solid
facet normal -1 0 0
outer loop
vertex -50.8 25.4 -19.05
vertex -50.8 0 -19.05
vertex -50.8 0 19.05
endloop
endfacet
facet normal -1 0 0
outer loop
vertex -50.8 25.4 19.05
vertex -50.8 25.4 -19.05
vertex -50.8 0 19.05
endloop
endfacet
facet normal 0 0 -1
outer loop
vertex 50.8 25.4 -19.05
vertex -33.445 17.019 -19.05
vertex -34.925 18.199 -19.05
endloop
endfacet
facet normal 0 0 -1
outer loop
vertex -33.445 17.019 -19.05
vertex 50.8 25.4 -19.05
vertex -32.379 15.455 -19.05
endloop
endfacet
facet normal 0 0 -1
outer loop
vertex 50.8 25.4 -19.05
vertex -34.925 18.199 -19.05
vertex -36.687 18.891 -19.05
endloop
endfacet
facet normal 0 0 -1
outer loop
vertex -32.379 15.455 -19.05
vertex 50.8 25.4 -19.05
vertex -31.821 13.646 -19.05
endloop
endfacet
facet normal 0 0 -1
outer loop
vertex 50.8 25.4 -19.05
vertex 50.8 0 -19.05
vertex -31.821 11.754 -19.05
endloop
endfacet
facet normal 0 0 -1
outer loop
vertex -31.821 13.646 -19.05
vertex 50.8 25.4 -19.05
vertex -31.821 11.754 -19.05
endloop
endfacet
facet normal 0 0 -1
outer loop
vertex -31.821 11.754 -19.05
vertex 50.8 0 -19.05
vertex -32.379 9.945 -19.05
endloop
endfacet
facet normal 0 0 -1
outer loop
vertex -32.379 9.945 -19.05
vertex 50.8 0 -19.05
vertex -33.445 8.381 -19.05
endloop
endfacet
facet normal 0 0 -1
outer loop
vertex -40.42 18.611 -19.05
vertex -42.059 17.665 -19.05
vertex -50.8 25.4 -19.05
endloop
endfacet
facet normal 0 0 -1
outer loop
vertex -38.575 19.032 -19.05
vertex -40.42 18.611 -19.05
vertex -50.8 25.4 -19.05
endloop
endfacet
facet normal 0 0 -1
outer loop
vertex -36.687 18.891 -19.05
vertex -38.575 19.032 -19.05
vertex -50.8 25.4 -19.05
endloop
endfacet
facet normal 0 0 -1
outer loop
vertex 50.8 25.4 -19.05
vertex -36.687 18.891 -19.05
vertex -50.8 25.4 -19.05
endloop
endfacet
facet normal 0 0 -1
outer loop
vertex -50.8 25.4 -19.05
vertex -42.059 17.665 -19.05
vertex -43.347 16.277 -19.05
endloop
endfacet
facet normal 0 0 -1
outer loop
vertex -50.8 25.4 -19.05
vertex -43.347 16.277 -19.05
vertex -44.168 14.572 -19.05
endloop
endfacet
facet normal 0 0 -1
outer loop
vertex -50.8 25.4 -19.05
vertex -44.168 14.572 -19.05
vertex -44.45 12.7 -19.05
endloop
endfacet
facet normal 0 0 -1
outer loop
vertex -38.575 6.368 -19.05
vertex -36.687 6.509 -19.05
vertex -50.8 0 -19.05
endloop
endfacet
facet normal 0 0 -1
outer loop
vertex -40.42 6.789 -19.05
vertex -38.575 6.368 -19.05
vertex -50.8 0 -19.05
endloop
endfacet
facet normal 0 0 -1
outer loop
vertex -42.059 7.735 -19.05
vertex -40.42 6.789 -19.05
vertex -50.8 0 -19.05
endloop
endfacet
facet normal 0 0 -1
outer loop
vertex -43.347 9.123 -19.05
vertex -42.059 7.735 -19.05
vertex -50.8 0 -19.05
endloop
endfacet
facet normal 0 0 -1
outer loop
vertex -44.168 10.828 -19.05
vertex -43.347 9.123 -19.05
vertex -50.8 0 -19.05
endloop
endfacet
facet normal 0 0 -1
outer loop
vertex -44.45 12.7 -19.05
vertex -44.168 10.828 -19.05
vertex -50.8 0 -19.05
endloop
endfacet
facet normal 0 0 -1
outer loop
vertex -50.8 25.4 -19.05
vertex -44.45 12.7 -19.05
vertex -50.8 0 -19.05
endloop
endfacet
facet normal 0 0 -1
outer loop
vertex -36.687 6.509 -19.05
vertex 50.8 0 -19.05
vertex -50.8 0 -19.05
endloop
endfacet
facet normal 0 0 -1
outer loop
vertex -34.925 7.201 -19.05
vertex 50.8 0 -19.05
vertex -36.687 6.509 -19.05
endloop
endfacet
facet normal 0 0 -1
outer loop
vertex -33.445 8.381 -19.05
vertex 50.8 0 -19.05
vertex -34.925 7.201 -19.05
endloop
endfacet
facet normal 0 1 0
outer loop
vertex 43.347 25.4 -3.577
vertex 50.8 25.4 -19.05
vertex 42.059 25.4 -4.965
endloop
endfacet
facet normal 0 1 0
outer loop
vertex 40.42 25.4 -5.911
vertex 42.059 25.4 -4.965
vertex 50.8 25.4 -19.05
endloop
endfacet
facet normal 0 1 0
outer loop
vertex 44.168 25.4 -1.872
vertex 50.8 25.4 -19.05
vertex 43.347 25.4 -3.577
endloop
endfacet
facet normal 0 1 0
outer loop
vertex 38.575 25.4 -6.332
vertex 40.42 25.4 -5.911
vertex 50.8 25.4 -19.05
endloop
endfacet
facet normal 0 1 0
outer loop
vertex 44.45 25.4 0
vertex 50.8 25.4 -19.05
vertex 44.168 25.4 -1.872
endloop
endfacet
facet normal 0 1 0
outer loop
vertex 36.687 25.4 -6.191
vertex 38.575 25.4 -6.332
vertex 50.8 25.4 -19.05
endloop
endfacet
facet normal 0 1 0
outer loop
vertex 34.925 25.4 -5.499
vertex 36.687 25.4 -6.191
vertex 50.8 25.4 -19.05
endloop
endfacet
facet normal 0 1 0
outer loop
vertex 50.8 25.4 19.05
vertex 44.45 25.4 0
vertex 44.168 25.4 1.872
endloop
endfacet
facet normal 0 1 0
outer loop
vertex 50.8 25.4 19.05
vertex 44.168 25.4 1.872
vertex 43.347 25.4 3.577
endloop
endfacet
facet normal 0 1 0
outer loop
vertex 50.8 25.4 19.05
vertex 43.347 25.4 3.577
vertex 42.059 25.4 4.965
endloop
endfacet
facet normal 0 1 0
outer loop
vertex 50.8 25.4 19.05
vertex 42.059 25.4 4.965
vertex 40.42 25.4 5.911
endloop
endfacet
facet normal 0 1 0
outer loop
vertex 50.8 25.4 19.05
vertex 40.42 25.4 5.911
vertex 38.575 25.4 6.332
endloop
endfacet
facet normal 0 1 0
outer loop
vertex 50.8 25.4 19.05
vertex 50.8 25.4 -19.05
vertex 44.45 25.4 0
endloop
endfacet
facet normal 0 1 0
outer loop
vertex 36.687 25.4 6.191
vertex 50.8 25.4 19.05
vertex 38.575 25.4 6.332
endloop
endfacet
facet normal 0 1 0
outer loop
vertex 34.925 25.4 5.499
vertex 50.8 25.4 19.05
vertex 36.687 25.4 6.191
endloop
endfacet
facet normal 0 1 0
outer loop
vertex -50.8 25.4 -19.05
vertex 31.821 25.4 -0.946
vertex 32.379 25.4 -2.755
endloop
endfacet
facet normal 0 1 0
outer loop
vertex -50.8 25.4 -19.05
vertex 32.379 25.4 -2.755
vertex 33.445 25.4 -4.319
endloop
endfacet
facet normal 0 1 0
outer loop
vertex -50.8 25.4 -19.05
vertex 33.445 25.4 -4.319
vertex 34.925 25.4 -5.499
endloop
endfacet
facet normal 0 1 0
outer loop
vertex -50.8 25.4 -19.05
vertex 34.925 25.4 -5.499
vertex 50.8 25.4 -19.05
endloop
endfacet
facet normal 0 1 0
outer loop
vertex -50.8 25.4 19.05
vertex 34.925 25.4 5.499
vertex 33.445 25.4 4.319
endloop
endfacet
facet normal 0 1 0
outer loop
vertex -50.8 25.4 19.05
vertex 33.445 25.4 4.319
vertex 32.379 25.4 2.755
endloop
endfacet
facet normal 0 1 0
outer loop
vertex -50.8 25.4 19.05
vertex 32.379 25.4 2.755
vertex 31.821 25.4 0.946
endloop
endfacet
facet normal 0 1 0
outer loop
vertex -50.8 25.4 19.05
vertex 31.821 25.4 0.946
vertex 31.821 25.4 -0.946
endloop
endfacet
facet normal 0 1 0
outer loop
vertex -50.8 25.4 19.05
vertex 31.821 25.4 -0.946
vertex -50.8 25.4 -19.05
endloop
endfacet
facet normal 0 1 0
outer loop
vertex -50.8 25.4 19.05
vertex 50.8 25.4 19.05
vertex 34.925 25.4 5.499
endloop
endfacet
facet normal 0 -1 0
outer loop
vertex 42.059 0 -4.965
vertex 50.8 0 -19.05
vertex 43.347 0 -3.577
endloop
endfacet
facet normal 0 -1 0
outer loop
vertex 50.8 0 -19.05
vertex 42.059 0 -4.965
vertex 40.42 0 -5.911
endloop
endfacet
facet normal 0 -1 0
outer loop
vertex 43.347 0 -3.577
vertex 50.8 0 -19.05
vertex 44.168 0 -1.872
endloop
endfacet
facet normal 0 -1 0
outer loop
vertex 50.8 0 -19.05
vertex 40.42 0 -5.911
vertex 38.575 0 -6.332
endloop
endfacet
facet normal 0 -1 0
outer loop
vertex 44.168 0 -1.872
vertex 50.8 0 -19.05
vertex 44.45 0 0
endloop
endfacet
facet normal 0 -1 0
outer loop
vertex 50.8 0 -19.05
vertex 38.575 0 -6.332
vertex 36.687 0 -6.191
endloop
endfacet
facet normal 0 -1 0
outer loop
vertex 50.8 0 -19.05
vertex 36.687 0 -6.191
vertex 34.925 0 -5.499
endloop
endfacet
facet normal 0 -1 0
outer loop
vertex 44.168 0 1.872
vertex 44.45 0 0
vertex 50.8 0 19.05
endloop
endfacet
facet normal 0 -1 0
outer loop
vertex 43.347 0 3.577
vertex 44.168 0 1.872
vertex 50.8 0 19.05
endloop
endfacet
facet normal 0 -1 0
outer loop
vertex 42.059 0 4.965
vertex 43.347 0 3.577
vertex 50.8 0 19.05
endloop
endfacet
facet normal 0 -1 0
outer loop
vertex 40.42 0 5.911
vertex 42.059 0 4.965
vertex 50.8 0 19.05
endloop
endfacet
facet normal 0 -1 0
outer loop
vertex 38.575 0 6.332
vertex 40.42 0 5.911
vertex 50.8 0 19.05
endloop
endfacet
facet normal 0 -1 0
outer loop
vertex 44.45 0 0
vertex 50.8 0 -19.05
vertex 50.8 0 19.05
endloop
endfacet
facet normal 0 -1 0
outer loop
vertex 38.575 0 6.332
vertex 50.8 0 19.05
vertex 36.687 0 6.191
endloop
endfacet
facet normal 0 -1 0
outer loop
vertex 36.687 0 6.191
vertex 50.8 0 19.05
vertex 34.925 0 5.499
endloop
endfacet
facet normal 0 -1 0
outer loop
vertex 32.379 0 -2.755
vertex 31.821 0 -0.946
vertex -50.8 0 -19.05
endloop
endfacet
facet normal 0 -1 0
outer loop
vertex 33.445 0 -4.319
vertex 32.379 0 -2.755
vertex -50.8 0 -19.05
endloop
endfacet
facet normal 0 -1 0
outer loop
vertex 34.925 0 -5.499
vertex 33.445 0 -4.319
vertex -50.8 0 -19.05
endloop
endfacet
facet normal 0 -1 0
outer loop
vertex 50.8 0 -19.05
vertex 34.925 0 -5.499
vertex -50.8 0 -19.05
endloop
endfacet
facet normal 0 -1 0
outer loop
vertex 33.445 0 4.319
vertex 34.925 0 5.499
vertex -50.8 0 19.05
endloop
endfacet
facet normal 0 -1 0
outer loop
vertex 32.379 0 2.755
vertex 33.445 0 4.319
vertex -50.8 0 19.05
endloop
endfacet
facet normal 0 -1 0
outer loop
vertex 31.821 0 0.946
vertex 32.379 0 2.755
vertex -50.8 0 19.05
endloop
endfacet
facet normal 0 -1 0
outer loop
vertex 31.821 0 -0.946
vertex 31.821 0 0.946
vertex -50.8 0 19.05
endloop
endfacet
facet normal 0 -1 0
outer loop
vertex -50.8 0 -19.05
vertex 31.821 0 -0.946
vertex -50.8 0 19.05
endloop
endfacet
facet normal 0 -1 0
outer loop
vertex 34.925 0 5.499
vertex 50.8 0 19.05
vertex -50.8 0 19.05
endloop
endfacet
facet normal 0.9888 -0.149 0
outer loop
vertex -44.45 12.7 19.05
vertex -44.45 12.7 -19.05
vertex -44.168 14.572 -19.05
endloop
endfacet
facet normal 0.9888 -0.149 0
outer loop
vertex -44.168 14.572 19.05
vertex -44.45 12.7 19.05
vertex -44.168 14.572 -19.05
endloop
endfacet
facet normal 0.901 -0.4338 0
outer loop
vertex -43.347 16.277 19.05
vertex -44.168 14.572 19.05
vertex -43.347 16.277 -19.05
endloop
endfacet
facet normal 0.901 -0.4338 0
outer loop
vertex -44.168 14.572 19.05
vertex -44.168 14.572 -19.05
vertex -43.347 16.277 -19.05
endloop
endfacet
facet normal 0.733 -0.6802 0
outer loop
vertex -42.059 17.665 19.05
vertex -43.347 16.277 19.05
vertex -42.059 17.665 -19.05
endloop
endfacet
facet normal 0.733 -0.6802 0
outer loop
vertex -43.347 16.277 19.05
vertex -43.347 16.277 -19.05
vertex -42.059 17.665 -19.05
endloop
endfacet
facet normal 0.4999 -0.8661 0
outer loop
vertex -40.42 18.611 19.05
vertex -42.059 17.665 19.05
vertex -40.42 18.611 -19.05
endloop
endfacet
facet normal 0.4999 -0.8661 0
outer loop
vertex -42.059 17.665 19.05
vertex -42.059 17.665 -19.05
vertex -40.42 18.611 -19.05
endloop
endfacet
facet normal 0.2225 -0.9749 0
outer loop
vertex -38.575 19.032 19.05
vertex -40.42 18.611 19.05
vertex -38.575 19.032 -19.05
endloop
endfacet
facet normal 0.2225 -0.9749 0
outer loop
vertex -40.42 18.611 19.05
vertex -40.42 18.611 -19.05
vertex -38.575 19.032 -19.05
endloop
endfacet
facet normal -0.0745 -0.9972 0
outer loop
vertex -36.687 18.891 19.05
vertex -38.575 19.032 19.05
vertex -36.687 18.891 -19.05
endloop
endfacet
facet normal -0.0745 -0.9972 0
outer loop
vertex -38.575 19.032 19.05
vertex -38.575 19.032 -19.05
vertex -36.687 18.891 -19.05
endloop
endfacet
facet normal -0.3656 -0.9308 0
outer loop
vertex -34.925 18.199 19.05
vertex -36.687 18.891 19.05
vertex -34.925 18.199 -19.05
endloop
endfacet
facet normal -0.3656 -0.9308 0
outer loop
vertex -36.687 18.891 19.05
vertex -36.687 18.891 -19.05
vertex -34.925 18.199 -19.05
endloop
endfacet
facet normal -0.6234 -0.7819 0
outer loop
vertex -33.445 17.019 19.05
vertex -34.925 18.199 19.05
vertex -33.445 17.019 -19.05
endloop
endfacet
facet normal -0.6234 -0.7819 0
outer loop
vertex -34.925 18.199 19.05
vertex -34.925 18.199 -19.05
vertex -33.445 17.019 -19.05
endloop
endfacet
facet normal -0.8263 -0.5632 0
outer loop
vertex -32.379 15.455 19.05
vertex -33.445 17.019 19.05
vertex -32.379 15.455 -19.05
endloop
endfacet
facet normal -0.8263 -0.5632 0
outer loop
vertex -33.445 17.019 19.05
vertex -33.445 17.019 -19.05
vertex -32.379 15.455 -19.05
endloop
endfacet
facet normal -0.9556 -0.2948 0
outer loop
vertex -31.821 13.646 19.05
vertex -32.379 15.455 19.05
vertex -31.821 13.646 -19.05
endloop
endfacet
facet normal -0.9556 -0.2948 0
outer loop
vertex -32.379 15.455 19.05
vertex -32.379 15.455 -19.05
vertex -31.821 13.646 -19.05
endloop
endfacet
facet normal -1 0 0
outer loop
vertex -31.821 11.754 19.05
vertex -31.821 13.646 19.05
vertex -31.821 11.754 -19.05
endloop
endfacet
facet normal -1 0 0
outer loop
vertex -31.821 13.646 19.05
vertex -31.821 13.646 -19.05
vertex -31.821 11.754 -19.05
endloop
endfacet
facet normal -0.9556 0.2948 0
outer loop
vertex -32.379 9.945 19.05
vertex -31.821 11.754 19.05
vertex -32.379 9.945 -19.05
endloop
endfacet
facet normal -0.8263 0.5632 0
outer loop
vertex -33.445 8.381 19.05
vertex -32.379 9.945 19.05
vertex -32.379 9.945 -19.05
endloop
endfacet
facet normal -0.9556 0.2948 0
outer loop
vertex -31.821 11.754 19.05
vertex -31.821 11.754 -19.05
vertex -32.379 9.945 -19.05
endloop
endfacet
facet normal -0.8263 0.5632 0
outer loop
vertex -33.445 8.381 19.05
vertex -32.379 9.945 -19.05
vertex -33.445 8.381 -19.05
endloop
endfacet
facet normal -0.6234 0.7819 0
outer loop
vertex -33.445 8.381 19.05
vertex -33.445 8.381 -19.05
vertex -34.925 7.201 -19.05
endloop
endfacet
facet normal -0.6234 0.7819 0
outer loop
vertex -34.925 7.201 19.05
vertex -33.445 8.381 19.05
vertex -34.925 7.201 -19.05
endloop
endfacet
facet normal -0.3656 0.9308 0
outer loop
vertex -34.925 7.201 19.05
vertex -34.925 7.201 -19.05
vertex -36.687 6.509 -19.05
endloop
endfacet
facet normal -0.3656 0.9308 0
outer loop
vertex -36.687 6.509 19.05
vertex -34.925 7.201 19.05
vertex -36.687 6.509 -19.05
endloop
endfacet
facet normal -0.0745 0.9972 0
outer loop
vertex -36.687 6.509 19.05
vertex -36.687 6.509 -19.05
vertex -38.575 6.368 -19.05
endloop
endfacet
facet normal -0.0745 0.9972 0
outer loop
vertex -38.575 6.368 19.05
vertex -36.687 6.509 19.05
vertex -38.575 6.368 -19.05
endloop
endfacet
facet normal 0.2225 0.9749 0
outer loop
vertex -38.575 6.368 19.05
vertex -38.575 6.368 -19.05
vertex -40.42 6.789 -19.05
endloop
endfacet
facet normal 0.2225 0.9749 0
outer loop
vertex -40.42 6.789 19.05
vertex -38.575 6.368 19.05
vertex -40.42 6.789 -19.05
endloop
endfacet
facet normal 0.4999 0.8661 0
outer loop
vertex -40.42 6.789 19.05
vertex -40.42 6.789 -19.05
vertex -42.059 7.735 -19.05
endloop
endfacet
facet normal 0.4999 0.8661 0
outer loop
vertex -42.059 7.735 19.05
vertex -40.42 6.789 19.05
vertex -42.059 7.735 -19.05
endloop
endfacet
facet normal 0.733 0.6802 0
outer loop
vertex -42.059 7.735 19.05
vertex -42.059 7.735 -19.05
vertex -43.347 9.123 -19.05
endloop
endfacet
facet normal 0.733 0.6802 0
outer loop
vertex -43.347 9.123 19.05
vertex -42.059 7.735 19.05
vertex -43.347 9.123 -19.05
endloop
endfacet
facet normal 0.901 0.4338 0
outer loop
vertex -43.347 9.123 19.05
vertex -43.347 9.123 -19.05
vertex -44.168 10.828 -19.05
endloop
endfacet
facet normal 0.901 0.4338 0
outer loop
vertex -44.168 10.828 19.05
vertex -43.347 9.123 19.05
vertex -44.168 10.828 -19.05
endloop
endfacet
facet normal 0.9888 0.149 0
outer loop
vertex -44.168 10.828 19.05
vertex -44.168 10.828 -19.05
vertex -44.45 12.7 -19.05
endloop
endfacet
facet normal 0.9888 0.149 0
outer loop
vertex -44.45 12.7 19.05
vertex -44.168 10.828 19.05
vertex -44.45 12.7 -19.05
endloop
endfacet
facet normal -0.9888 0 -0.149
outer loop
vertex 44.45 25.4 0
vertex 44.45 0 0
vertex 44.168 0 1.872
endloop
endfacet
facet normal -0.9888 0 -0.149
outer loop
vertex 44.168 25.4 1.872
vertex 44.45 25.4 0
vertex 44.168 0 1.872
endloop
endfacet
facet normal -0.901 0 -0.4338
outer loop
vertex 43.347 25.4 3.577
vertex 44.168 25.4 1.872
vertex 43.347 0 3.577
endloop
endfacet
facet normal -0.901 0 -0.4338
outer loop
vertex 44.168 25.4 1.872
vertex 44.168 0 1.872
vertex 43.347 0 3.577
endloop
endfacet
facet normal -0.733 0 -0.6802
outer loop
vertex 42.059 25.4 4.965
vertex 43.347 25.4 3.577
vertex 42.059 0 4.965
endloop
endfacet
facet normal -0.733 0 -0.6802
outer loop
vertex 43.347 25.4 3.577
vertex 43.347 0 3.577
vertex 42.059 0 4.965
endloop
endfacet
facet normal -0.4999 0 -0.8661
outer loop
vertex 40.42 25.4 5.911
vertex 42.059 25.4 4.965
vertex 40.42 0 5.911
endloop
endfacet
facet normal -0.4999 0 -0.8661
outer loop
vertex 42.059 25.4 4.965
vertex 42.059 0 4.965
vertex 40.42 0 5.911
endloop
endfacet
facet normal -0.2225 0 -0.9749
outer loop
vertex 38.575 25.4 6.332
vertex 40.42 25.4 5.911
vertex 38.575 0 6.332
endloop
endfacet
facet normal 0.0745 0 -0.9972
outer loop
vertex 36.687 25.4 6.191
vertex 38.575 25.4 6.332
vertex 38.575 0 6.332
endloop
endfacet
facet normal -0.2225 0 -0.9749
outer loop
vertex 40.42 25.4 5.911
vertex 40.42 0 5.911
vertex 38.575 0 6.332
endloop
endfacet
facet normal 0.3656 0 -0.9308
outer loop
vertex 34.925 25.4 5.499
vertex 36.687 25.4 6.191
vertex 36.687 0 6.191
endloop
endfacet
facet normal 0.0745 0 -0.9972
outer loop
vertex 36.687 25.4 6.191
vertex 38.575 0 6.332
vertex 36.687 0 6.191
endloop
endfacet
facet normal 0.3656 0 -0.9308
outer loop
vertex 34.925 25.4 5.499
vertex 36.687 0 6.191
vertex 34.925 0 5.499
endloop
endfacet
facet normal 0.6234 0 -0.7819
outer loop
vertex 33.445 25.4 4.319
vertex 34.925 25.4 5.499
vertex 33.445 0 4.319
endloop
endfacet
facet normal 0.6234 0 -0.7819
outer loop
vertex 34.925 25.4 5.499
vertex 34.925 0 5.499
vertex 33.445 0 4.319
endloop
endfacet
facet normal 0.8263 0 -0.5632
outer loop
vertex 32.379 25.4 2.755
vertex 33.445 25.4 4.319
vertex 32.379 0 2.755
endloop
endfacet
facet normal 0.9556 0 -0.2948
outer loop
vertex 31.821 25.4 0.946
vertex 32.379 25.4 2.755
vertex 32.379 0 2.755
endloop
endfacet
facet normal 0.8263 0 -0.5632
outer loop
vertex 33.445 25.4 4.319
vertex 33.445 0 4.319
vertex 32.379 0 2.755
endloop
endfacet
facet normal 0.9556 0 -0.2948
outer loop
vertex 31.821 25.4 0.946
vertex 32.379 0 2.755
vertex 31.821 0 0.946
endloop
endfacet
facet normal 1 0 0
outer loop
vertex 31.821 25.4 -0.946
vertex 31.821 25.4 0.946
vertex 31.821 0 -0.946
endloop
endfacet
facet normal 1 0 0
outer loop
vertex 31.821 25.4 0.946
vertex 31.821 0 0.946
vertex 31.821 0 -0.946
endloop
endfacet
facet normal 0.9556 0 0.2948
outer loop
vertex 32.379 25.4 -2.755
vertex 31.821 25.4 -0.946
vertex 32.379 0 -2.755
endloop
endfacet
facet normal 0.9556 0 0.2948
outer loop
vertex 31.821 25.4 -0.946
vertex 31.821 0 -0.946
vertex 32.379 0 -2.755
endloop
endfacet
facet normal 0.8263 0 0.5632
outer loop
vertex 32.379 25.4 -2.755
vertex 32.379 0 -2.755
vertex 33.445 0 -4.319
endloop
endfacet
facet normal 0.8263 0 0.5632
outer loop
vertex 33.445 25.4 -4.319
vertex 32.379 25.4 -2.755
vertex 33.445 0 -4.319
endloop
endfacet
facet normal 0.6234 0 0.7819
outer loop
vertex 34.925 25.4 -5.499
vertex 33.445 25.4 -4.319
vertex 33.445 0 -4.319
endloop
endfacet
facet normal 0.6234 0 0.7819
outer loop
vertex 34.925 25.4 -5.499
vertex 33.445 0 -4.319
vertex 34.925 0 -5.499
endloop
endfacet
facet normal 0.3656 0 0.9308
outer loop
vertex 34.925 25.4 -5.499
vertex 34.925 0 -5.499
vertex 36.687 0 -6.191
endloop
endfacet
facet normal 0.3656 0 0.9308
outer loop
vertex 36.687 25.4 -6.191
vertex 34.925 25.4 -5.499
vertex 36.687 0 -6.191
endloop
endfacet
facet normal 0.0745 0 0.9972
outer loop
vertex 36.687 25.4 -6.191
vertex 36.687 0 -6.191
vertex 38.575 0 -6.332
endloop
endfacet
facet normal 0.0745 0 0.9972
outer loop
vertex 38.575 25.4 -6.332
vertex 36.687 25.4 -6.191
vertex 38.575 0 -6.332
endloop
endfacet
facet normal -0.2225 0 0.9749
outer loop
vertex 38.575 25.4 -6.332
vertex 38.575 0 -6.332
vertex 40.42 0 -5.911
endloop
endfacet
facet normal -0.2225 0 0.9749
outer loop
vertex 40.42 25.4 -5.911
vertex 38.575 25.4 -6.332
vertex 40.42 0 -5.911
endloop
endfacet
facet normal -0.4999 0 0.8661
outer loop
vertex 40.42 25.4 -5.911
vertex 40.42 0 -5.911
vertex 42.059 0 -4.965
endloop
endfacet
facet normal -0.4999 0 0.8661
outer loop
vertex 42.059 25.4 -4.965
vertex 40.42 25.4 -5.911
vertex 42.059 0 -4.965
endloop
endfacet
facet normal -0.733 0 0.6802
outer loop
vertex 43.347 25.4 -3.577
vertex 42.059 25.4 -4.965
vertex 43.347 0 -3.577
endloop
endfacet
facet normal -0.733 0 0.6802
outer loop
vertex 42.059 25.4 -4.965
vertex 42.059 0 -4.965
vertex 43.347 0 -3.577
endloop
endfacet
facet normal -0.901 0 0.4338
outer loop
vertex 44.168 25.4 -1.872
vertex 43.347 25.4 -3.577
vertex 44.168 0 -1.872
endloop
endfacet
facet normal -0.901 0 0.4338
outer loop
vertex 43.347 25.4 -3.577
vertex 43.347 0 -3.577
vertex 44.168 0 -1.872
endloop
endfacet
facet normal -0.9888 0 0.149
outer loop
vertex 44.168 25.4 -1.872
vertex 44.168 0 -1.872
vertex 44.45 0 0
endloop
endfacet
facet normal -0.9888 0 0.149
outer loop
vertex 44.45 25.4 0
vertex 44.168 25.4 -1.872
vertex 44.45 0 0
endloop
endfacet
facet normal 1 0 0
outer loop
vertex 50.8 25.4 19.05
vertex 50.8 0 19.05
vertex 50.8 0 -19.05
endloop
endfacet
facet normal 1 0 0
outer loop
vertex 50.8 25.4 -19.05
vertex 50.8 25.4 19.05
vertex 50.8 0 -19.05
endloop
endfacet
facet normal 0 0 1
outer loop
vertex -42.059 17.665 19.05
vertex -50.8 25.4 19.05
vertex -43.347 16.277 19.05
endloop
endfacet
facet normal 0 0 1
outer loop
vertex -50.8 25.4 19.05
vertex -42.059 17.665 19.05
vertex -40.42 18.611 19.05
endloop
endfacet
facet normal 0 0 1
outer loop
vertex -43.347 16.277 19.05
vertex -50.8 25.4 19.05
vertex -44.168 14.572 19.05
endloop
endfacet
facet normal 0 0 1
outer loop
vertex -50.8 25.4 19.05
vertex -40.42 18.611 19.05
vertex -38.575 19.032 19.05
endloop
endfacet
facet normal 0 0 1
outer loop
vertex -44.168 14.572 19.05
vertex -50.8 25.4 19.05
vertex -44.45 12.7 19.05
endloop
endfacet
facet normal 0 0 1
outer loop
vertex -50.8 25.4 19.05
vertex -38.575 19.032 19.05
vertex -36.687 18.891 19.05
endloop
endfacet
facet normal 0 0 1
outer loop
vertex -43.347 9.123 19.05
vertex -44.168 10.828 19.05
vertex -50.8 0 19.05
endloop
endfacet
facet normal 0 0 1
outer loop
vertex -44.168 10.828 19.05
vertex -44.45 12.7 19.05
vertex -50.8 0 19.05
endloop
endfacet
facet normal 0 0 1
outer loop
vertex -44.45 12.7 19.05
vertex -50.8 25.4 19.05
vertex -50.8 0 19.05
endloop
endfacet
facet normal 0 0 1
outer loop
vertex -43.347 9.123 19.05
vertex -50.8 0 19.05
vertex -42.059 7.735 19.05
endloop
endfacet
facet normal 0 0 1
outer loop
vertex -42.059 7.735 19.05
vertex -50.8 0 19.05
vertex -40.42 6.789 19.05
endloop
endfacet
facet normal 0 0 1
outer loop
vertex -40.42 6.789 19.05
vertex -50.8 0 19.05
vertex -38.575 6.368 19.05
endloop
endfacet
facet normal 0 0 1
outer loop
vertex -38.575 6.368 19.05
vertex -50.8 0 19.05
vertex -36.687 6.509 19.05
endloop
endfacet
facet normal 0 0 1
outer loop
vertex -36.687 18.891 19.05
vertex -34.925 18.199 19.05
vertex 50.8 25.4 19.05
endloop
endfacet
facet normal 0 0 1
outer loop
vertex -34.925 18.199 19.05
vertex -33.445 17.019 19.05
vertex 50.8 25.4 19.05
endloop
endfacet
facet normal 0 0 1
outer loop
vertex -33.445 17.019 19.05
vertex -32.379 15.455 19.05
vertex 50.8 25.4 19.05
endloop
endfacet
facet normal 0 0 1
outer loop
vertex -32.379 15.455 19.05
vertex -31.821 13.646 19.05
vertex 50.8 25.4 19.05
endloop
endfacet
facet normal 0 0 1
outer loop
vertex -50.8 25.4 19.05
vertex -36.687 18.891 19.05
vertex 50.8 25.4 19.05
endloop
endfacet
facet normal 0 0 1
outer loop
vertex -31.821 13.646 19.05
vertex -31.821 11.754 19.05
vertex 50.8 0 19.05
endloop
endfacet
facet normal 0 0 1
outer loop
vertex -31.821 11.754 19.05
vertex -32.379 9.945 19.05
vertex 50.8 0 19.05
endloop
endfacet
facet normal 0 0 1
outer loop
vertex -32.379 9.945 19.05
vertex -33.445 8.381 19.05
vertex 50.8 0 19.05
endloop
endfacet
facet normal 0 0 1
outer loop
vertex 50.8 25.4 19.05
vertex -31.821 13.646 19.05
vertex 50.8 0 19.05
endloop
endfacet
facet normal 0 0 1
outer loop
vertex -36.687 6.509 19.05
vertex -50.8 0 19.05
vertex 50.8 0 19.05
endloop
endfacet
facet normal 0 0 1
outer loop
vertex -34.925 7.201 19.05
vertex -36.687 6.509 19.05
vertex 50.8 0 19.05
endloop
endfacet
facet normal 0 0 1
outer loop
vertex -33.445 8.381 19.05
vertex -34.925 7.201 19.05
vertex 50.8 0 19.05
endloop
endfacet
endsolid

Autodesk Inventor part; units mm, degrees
ref_plane "YZ Plane" through (0, 0, 0) normal (1, 0, 0) x (0, 1, 0)
ref_plane "XZ Plane" through (0, 0, 0) normal (0, 1, 0) x (-1, 0, 0)
ref_plane "XY Plane" through (0, 0, 0) normal (0, 0, 1) x (1, 0, 0)
sketch "Sketch1" plane through (0, 0, 0) normal (0, 1, 0) x (-1, 0, 0)
  line L0 (-50.8, -19.05) -> (50.8, -19.05)
  line L1 (50.8, -19.05) -> (50.8, 19.05)
  line L2 (50.8, 19.05) -> (-50.8, 19.05)
  line L3 (-50.8, 19.05) -> (-50.8, -19.05)
  line L4 (-50.8, -19.05) -> (50.8, 19.05) construction
  line L5 (50.8, -19.05) -> (-50.8, 19.05) construction
  point P0 (0, 0)
  dimension "d0" = 38.1
  dimension "d1" = 101.6
extrude "Extrusion1" add sketch "Sketch1" along normal blind 25.4
sketch "Sketch2" plane through (50.8, 0, -19.05) normal (0, 0, -1) x (-1, 0, 0)
  line L0 (101.6, 0) -> (101.6, 25.4) projected
  line L1 (101.6, 12.7) -> (0, 12.7) construction
  line L2 (0, 0) -> (0, 25.4) projected
  circle A0 centre (88.9, 12.7) radius 6.35
  point P0 (50.8, 0)
  dimension "d4" = 12.7
  dimension "d5" = 12.7
extrude "Extrusion2" cut sketch "Sketch2" against normal through all
sketch "Sketch3" plane through (0, 0, 0) normal (0, -1, 0) x (1, 0, 0)
  line L0 (50.8, 19.05) -> (50.8, -19.05) projected
  line L1 (50.8, 0) -> (-50.8, 0) construction
  line L2 (-50.8, -19.05) -> (-50.8, 19.05) projected
  circle A0 centre (38.1, 0) radius 6.35
  point P0 (0, 0)
  dimension "d8" = 12.7
  dimension "d9" = 12.7
extrude "Extrusion3" cut sketch "Sketch3" against normal blind 25.4
properties part number "tie rod"
